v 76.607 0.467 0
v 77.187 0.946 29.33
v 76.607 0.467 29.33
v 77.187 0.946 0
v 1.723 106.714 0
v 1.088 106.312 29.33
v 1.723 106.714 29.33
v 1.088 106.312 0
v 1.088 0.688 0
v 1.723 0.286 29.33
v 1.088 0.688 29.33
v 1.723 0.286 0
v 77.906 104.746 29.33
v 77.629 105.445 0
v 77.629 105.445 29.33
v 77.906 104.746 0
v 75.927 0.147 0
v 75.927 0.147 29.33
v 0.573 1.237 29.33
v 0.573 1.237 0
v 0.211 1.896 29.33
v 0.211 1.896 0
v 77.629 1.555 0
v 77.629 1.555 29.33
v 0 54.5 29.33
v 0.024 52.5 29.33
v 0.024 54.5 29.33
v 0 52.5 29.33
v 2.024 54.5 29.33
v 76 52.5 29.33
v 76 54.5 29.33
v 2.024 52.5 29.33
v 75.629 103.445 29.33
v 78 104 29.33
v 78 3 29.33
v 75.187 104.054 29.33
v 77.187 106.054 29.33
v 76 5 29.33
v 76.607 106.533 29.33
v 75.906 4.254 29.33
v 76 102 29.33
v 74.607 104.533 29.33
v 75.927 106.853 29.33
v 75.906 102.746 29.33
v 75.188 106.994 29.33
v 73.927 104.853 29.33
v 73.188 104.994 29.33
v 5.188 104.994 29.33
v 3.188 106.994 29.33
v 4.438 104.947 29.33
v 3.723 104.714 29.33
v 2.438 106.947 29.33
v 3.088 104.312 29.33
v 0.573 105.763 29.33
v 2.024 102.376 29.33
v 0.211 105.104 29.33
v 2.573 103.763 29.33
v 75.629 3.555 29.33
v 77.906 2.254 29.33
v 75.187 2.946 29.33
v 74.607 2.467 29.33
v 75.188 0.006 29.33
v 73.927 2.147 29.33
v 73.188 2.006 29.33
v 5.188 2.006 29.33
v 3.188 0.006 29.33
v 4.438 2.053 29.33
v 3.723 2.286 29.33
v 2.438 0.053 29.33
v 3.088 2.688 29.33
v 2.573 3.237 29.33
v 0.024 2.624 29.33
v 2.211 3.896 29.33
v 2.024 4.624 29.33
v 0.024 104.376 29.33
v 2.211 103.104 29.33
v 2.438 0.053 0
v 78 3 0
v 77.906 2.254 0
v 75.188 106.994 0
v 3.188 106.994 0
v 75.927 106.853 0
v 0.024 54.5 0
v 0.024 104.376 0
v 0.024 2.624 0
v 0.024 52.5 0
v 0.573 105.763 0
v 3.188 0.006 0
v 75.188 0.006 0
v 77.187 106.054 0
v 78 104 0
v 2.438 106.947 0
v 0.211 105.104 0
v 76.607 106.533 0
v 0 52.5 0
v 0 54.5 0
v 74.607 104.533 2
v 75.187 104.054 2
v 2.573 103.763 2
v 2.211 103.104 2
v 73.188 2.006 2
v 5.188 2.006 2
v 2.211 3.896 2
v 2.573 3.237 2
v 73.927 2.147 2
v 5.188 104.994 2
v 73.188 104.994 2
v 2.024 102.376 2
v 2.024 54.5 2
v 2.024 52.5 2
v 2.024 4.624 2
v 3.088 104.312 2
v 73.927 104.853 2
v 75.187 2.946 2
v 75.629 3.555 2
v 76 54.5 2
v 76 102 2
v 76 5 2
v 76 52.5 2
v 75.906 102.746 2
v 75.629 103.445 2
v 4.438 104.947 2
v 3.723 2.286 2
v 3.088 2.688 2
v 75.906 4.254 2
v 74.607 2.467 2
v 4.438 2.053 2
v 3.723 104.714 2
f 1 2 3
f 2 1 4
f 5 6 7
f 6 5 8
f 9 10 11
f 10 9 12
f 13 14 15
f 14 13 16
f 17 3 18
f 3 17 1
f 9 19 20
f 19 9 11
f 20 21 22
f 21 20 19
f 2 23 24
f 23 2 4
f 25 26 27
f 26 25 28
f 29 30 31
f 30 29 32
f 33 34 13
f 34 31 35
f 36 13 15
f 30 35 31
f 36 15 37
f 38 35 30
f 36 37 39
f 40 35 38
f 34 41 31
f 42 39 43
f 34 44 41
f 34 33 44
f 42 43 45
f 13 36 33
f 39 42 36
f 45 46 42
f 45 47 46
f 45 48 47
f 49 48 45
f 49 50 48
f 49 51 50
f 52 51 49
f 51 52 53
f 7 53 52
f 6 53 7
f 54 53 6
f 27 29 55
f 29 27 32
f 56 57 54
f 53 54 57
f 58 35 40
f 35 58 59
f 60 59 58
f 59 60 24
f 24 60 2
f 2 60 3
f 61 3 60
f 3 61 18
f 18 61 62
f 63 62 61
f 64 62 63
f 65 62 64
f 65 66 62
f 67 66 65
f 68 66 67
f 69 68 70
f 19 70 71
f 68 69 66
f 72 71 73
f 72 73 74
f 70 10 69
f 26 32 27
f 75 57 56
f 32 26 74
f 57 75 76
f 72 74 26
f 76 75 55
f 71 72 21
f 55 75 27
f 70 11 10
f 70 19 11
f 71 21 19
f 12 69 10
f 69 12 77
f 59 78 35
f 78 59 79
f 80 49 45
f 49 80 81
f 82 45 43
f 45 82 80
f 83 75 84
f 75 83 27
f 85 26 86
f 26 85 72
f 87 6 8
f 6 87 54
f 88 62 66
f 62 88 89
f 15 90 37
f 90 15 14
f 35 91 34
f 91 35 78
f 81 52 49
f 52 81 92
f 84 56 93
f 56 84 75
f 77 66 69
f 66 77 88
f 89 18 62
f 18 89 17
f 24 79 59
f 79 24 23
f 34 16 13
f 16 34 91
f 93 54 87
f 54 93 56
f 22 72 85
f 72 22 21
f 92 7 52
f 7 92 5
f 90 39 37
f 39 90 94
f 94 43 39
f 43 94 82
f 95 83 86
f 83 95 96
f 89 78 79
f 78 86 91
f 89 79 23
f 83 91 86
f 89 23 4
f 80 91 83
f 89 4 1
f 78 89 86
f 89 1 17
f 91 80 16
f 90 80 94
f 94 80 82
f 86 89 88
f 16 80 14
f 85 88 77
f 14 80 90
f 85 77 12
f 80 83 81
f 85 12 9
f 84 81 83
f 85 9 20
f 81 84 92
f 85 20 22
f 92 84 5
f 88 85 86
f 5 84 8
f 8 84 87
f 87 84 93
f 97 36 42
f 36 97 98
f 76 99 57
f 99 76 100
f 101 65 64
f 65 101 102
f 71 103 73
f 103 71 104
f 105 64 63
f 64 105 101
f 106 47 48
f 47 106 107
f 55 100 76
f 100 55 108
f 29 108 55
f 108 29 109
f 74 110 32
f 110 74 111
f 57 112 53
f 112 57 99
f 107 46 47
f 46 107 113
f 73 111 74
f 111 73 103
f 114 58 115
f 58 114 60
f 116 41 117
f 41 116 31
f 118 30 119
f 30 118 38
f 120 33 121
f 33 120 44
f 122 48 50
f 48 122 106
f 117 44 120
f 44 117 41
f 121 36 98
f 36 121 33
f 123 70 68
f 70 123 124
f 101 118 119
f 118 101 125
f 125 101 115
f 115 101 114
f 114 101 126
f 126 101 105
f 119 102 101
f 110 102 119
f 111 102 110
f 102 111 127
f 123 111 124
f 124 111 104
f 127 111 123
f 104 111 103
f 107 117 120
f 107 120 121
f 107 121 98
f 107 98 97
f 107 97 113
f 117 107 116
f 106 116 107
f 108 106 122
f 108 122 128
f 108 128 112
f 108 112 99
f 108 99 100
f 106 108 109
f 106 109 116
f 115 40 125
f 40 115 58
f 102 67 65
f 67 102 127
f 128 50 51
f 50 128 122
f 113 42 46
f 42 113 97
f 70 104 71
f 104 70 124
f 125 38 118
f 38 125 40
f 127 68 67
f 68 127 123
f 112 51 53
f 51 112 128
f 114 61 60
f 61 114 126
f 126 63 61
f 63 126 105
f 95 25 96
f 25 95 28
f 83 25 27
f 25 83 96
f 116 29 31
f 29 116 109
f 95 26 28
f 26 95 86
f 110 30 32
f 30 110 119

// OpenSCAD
x_length = 2;
y_length = 2;
x_divisions = 0;
y_divisions = 1;
height = 29.33; //[91:Full Height,59.66:2/3 Height,44.5:1/2 Height,29.33:1/3 Height,21.75:1/4 Height,14.166:1/6 Height,6.5833:1/12 Height]

// So long as the dividers line up with a compartment size (x - 1 or x/2 -1, same for y), leave 0.  Otherwise set to something like 2.
divider_height_subtract = 0;

// ignore variable values
divider_height = height - divider_height_subtract;

module stanley_container(x, y, x_div, y_div, height=29, divider_height=divider_height) {
    difference() {
        hull() {
            translate([3,3,0]) cylinder(height,3,3,$fn=25);
            translate([39*x-3,3,0]) cylinder(height,3,3,$fn=25);
            translate([3,53.5*y-3,0]) cylinder(height,3,3,$fn=25);
            translate([39*x-3,53.5*y-3,0]) cylinder(height,3,3,$fn=25);
        }
        hull() {
            translate([5,5,2]) cylinder(height,3,3,$fn=25);
            translate([39*x-5,5,2]) cylinder(height,3,3,$fn=25);
            translate([5,53.5*y-5,2]) cylinder(height,3,3,$fn=25);
            translate([39*x-5,53.5*y-5,2]) cylinder(height,3,3,$fn=25);
        }
    }
    if (x_div > 0) {
        for(i = [1:x_div]) {
            compartment = (39*x)/(x_div + 1);
            translate([compartment * i - 1,0,0]) cube([2, 53.5*y, divider_height]);
        }
    }
    if (y_div > 0) {
        for(i = [1:y_div]) {
            compartment = (53.5*y)/(y_div + 1);
            translate([0,compartment * i - 1,0]) cube([39*x, 2, divider_height]);
        }
    }
}

// 1/12 = 6.5833 * 12 + 12 = 91
// 1/6 = 14.166 * 6 + 6 = 91
// 1/4 = 21.75 * 4 + 4 = 91
// 1/3 = 29.33 * 3 + 3 = 91
// 5/12 = 37.92 + (29.33 + 1) + (21.75 + 1) = 90
// 1/2 = 44.5 * 2 + 2 = 91
// 2/3 = 59.66 + 1 + 29.33 + 1 = 90
// 1 = 91
stanley_container(x_length,y_length,x_divisions,y_divisions,height);
//translate([0,53.5-1,0]) cube([39*2, 2, 36.5]);
//translate([39-1,0,0]) cube([2, 53.5*2, 36.5]);
